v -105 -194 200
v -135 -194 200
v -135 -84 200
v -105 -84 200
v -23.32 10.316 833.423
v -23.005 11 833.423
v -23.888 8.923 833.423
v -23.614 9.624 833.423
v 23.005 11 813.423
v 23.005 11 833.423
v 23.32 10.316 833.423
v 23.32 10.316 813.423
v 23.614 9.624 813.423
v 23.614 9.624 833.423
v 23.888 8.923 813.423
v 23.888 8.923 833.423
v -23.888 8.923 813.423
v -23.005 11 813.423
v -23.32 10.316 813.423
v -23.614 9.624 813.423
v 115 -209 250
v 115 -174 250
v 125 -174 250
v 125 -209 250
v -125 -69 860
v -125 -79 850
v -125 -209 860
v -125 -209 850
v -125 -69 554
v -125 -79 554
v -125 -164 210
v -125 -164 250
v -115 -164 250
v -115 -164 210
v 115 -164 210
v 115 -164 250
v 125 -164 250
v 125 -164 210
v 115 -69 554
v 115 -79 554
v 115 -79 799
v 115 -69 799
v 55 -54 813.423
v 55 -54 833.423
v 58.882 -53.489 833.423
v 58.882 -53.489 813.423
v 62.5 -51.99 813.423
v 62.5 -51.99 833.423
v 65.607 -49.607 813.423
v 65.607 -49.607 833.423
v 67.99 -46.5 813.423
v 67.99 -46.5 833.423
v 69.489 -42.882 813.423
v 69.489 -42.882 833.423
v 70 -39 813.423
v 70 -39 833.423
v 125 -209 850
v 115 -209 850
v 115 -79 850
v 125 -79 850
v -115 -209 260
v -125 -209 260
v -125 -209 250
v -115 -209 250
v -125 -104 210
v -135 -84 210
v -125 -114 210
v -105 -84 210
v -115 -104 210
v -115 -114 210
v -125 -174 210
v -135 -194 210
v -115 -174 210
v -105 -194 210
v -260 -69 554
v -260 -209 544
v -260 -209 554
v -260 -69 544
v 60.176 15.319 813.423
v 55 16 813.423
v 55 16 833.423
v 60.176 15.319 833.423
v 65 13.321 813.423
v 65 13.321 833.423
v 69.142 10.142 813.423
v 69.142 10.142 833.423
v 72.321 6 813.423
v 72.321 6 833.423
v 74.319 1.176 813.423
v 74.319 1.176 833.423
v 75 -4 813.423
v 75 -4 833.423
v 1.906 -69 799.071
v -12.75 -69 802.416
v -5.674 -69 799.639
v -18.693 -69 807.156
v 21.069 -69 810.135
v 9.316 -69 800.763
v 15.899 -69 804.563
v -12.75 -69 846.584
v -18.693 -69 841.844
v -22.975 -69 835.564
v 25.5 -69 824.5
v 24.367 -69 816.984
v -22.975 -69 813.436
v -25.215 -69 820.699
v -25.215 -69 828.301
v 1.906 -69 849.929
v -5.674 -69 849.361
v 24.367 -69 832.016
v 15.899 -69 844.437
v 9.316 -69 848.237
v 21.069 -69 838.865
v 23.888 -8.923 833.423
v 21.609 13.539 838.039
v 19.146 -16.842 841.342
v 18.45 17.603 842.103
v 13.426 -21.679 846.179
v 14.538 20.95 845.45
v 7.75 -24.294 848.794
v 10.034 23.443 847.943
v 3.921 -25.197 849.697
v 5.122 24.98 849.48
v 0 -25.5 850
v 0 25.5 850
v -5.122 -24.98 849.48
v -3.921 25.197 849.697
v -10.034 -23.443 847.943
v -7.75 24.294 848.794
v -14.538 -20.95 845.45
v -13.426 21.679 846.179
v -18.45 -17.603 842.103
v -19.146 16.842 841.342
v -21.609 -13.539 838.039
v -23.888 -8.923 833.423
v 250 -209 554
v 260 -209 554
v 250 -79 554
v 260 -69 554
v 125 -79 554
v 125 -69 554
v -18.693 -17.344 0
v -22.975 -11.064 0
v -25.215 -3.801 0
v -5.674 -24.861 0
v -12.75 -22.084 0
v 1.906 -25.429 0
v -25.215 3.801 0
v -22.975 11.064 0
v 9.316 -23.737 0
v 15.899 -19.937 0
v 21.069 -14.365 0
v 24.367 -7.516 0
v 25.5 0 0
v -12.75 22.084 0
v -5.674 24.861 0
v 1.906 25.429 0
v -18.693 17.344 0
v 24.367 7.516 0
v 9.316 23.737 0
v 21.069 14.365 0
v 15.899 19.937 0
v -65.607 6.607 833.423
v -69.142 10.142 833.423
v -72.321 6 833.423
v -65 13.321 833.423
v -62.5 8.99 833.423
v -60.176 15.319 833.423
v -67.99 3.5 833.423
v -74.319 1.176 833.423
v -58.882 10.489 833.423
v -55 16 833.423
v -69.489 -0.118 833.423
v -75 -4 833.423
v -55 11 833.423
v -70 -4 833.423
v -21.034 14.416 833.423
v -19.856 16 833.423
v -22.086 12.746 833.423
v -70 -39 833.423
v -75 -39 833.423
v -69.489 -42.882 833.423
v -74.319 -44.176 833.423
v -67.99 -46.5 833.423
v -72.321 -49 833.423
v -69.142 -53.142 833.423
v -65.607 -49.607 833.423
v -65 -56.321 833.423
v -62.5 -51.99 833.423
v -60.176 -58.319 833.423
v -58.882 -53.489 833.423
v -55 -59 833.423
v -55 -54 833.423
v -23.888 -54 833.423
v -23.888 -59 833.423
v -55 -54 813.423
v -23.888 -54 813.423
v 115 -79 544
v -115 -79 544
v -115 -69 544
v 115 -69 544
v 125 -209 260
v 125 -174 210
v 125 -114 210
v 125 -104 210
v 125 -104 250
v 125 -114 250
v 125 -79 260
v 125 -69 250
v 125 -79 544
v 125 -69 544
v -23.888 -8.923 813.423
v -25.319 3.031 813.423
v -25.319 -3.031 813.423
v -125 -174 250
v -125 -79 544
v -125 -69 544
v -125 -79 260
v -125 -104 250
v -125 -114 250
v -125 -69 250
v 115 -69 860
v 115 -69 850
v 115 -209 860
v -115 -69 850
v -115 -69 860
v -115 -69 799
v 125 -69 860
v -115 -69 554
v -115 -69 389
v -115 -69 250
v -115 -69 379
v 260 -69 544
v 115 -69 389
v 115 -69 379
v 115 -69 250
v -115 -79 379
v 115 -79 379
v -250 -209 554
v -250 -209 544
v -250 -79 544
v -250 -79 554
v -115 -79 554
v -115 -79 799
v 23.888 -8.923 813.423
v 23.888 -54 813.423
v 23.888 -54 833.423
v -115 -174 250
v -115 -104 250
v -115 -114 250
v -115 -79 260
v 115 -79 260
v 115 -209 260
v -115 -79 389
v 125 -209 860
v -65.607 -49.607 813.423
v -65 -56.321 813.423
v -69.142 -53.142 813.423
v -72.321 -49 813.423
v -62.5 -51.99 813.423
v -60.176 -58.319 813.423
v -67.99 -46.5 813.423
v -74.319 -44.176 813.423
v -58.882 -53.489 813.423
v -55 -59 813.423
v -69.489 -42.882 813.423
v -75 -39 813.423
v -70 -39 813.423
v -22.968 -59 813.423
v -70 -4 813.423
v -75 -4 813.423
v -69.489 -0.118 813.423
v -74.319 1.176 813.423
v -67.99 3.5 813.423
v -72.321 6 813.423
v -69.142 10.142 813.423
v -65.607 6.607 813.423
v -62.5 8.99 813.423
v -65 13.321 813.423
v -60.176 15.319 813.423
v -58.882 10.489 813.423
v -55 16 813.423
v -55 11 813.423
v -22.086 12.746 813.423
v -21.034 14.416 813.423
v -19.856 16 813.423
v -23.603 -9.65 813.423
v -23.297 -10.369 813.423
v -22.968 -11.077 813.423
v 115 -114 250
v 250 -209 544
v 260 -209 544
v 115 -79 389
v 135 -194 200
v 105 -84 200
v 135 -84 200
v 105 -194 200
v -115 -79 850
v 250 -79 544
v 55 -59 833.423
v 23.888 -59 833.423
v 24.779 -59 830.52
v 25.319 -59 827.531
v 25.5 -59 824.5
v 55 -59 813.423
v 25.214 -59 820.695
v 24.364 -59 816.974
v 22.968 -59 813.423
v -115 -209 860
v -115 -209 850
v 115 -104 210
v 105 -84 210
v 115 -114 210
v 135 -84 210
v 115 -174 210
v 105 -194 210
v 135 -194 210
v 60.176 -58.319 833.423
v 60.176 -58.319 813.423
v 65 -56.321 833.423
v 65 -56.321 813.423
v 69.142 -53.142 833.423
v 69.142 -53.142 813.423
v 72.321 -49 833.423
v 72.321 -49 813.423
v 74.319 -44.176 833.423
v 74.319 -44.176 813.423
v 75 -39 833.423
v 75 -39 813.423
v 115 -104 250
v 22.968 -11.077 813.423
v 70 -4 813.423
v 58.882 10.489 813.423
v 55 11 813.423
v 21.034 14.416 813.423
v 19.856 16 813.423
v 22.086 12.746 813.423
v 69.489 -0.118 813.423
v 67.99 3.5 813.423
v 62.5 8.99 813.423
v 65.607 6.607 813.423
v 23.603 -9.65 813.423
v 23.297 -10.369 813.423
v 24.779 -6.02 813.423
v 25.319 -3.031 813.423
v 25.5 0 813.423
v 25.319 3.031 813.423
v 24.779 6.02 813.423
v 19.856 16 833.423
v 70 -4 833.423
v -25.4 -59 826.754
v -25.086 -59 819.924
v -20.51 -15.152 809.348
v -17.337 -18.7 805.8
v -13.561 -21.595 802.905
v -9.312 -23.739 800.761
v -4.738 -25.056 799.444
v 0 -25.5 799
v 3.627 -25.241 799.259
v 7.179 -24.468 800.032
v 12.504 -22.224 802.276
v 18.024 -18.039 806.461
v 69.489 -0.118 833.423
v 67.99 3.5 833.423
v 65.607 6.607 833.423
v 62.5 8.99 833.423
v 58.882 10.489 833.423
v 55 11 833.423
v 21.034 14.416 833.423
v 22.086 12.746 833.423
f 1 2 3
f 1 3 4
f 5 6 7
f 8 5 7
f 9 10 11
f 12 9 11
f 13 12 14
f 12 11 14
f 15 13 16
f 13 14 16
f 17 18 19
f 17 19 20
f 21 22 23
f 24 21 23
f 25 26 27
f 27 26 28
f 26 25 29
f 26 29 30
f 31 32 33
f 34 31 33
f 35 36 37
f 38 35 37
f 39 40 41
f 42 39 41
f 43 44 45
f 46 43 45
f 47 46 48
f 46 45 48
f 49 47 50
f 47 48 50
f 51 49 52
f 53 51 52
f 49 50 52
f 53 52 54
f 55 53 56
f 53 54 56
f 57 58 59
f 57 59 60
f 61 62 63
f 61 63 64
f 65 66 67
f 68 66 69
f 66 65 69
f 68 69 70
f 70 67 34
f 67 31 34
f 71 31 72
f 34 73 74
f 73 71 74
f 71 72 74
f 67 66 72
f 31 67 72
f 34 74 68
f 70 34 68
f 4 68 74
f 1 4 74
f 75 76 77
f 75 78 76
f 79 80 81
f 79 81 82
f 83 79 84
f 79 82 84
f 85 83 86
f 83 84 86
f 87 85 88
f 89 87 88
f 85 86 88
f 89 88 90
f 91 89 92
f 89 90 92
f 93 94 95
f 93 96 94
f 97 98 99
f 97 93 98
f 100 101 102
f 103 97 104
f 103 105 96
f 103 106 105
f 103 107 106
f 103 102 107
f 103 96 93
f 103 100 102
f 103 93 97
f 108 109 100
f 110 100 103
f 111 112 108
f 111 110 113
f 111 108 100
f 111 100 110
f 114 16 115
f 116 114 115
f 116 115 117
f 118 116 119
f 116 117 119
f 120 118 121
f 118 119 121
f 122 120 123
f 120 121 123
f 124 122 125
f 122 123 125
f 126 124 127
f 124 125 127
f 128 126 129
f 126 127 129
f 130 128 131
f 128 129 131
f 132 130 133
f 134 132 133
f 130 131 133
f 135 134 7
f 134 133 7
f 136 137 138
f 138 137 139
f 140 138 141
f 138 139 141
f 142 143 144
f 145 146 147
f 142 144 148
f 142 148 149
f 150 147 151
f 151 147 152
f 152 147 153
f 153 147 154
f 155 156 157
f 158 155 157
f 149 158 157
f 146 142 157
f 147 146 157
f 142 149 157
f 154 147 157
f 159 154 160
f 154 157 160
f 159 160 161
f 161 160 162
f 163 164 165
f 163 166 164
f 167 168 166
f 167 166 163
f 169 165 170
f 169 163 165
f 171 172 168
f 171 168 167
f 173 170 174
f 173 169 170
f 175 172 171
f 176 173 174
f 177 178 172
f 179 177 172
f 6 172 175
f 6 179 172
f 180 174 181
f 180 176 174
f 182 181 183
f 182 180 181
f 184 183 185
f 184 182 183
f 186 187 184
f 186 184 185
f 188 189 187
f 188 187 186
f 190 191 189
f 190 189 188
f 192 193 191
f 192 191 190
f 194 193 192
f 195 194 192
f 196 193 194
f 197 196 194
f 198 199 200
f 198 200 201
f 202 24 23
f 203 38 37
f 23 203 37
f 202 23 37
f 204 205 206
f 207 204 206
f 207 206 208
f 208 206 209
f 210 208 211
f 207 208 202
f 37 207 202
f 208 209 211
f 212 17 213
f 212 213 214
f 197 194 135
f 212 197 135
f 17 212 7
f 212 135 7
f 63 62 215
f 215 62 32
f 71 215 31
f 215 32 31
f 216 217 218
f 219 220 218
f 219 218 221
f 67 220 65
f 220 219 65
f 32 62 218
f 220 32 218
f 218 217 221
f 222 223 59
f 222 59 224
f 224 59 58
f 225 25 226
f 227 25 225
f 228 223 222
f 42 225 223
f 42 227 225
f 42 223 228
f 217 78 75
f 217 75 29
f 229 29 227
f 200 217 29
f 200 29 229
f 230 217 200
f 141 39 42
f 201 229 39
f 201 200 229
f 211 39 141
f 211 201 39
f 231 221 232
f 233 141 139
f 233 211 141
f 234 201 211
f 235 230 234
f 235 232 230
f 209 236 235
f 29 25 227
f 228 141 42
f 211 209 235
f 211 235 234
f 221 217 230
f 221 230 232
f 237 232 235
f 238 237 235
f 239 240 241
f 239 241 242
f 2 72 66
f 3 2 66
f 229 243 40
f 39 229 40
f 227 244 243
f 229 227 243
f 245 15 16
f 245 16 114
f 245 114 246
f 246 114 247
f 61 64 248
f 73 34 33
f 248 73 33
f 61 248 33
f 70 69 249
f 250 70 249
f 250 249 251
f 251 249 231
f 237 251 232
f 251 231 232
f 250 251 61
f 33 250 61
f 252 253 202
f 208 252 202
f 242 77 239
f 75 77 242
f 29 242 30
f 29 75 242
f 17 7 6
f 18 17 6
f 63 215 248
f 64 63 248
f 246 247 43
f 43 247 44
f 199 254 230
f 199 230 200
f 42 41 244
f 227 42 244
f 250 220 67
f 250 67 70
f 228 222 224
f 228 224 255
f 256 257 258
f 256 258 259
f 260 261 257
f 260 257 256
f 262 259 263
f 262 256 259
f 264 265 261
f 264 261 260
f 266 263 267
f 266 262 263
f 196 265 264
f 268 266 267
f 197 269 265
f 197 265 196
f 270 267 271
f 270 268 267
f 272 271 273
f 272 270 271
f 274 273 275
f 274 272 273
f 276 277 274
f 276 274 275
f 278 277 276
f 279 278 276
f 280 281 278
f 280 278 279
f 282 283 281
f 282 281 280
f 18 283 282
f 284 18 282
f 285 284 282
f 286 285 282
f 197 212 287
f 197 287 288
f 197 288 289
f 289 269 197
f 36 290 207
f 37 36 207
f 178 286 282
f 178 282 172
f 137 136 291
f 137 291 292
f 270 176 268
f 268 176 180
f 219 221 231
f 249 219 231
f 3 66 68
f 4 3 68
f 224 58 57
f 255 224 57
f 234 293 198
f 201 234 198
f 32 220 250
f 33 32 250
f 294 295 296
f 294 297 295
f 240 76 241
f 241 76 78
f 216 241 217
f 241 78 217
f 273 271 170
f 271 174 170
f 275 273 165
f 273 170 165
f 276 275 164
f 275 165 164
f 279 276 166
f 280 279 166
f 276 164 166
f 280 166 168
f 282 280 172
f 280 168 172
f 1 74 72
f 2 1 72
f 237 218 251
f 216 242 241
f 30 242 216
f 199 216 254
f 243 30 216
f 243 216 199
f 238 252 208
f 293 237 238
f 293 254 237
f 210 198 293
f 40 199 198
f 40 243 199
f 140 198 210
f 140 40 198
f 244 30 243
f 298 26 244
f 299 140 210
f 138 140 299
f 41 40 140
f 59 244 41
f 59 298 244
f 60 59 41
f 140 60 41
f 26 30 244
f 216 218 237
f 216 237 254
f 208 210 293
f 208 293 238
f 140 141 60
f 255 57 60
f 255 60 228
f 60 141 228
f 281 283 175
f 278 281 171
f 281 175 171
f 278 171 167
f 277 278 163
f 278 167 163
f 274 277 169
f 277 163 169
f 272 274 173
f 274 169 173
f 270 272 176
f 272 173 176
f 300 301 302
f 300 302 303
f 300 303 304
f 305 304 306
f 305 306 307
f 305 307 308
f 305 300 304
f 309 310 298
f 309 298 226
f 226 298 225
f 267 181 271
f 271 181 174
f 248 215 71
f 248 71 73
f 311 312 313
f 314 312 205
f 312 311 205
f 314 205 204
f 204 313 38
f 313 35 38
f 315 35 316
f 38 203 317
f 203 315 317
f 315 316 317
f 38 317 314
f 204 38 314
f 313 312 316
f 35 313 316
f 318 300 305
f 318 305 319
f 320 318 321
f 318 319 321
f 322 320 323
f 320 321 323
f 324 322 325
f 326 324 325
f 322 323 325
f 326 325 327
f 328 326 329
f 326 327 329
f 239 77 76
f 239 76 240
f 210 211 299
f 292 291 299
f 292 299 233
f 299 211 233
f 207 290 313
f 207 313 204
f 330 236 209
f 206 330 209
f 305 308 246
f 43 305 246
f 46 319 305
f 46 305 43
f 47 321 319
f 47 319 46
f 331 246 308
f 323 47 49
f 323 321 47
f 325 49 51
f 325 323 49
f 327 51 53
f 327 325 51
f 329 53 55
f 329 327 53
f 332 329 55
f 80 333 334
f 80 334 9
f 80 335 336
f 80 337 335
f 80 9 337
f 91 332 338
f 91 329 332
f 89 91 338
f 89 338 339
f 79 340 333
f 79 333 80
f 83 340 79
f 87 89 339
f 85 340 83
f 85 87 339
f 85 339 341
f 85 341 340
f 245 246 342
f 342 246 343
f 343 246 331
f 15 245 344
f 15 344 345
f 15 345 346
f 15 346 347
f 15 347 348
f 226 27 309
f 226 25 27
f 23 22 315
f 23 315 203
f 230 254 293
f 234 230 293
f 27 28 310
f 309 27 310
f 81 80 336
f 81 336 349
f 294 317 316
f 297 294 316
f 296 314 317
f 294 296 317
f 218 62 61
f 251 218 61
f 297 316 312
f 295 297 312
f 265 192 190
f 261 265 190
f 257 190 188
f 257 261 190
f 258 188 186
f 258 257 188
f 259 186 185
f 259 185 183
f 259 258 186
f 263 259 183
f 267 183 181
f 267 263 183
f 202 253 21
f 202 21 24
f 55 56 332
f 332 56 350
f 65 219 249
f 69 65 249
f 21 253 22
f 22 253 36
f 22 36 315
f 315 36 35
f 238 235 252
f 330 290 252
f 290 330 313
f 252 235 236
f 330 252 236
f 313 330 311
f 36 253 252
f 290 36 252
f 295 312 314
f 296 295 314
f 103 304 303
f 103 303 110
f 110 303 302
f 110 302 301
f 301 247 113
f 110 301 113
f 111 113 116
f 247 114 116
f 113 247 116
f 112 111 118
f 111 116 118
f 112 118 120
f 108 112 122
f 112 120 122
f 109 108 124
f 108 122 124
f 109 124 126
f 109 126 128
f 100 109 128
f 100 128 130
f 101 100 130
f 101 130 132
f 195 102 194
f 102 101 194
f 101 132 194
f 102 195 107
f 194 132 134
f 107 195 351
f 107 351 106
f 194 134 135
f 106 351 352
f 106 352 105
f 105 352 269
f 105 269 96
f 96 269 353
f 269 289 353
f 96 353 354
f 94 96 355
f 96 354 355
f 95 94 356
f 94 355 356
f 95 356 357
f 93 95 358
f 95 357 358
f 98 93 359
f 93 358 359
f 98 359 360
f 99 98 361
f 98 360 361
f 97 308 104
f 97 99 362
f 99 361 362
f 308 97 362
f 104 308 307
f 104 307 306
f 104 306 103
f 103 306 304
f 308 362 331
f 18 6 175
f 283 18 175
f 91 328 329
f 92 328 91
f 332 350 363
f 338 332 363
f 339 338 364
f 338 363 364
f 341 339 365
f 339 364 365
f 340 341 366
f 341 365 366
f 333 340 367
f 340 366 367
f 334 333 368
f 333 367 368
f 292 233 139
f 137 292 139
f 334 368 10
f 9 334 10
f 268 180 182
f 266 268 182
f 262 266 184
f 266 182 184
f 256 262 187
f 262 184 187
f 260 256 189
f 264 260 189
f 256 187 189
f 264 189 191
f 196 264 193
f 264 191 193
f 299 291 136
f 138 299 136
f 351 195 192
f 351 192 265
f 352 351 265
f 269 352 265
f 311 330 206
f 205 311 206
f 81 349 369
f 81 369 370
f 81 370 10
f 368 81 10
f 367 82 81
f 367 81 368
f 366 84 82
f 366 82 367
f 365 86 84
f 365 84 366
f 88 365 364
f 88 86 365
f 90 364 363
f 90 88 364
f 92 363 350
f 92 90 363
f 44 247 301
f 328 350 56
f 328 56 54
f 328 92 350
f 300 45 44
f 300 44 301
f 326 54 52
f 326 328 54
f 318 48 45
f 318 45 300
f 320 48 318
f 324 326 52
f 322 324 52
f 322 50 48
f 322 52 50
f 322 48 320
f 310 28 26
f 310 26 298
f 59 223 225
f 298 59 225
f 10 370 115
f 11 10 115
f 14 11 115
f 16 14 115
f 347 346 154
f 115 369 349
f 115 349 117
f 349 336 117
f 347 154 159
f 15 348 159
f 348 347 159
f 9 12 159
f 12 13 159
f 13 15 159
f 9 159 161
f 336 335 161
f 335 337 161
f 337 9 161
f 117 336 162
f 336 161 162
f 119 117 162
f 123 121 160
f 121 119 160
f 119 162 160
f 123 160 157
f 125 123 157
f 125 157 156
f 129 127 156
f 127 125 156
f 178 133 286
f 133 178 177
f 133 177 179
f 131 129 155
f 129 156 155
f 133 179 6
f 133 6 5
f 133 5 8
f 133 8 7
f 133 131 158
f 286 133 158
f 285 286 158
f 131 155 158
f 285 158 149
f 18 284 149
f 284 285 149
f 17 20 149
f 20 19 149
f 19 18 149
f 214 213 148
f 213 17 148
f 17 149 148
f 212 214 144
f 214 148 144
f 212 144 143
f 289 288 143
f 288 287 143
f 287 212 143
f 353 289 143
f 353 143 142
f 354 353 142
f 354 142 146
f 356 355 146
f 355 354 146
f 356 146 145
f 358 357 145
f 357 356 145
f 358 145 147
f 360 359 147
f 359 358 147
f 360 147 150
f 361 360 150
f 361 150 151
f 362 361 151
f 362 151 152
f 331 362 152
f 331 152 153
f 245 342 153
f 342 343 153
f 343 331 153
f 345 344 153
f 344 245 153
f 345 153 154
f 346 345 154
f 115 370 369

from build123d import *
from build123d import SkipClean  # not in build123d's __all__

# Parameters (mm, degrees)
F0_R      = 25.5
F1_DEPTH  = 850
F2_R      = 25.5
F3_DEPTH  = 69
F5_DEPTH  = 150
F7_DEPTH  = 75
F8_R      = 20
F10_DEPTH = 20
F12_DEPTH = 10
F13_W     = 230
F13_H     = 155
F14_DEPTH = 10
F16_W     = 10
F16_H     = 130
F16_H_2   = 10
F17_DEPTH = 10
F15_W     = 10
F15_H     = 10
F18_DEPTH = 130
F19_W     = 10
F19_H     = 10
F20_DEPTH = 40
F21_W     = 10
F21_H     = 10
F22_DEPTH = 10


with BuildPart() as f1:
    # F0 (on Top) → F1 (new body)
    with BuildSketch(Plane.XY):
        Circle(F0_R)
    extrude(amount=F1_DEPTH)

    # F2 (on Front) → F3 (join)
    with BuildSketch(Plane.XZ):
        with Locations((0, 824.5)):
            Circle(F2_R)
    with SkipClean():  # cleaning this boolean's faces spoils the solid; the shape is the same uncleaned
        extrude(amount=F3_DEPTH)

    # F4 (on face) → F5 (cut)
    with BuildSketch(Plane.XZ.offset(69)):
        with BuildLine():
            ThreePointArc((-25.5, 824.5), (0, 850), (25.5, 824.5))
            Line((25.5, 824.5), (45.5921813846, 824.5))
            Line((45.5921813846, 824.5), (45.5921813846, 859.704375267))
            Line((45.5921813846, 859.704375267), (-40.7917350531, 859.704375267))
            Line((-40.7917350531, 859.704375267), (-40.7917350531, 824.5))
            Line((-40.7917350531, 824.5), (-25.5, 824.5))
        make_face()
    extrude(amount=-F5_DEPTH, mode=Mode.SUBTRACT)

    # F6 (on Right) → F7 (join, symmetric)
    with BuildSketch(Plane.YZ):
        Polygon((-59, 833.4226703644), (-59, 823.4226703644), (-59, 813.4226703644), (16, 813.4226703644), (16, 833.4226703644), align=None)
    extrude(amount=F7_DEPTH, both=True)

    # F8
    f8_edges = [f1.edges().sort_by_distance(p)[0] for p in [
        (75, 16, 823.42267),
        (-75, 16, 823.42267),
        (-75, -59, 823.42267),
        (75, -59, 823.42267),
    ]]
    fillet(f8_edges, radius=F8_R)

    # F9 (on face) → F10 (cut)
    with BuildSketch(Plane.XY.offset(833.4226703644)):
        with BuildLine():
            Line((-23.8879876417, -54), (-23.8879876417, 8.9226703644))
            Line((-23.8879876417, 8.9226703644), (-23.0054341407, 11))
            Line((-23.0054341407, 11), (-55, 11))
            ThreePointArc((-55, 11), (-65.6066017178, 6.6066017178), (-70, -4))
            Line((-70, -4), (-70, -39))
            ThreePointArc((-70, -39), (-65.6066017178, -49.6066017178), (-55, -54))
            Line((-55, -54), (-23.8879876417, -54))
        make_face()
        with BuildLine():
            Line((23.8879876417, -8.9226703644), (23.8879876417, -54))
            Line((23.8879876417, -54), (55, -54))
            ThreePointArc((55, -54), (65.6066017178, -49.6066017178), (70, -39))
            Line((70, -39), (70, -4))
            ThreePointArc((70, -4), (65.6066017178, 6.6066017178), (55, 11))
            Line((55, 11), (23.0054341407, 11))
            ThreePointArc((23.0054341407, 11), (23.4697054992, 9.9711044415), (23.8879876417, 8.9226703644))
            Line((23.8879876417, 8.9226703644), (23.8879876417, -8.9226703644))
        make_face()
    extrude(amount=-F10_DEPTH, mode=Mode.SUBTRACT)


with BuildPart() as f12:
    # F11 (on face) → F12 (new body)
    with BuildSketch(Plane.XZ.offset(69)):
        Polygon((125, 554), (125, 850), (-125, 850), (-125, 554), (-260, 554), (-260, 544), (-125, 544), (-125, 250), (-115, 250), (-115, 379), (0, 379), (115, 379), (115, 250), (125, 250), (125, 544), (260, 544), (260, 554), align=None)
    extrude(amount=F12_DEPTH)

    # F13 (on face) → F14 (cut)
    with BuildSketch(Plane.XZ.offset(79)):
        Polygon((115, 799), (0, 799), (-115, 799), (-115, 554), (115, 554), align=None)
        with Locations((0, 466.5)):
            Rectangle(F13_W, F13_H)
    extrude(amount=-F14_DEPTH, mode=Mode.SUBTRACT)

    # F16 (on face) → F17 (join)
    with BuildSketch(Plane.XY.offset(850)):
        with Locations((-120, -144)):
            Rectangle(F16_W, F16_H)
        with Locations((120, -74)):
            Rectangle(F16_W, F16_H_2)
        with Locations((-120, -74)):
            Rectangle(F16_W, F16_H_2)
        with Locations((120, -144)):
            Rectangle(F16_W, F16_H)
    extrude(amount=F17_DEPTH)

    # F15 (on face) → F18 (join)
    with BuildSketch(Plane.XZ.offset(79)):
        with Locations((-255, 549)):
            Rectangle(F15_W, F15_H)
        with Locations((255, 549)):
            Rectangle(F15_W, F15_H)
        with Locations((120, 255)):
            Rectangle(F15_W, F15_H)
        with Locations((-120, 255)):
            Rectangle(F15_W, F15_H)
    extrude(amount=F18_DEPTH)

    # F19 (on face) → F20 (join)
    with BuildSketch(Plane(origin=(0, 0, 250), x_dir=(1, 0, 0), z_dir=(0, 0, -1))):
        with Locations((-120, 109)):
            Rectangle(F19_W, F19_H)
        with Locations((-120, 169)):
            Rectangle(F19_W, F19_H)
        with Locations((120, 169)):
            Rectangle(F19_W, F19_H)
        with Locations((120, 109)):
            Rectangle(F19_W, F19_H)
    extrude(amount=F20_DEPTH)

    # F21 (on face) → F22 (join)
    with BuildSketch(Plane(origin=(0, 0, 210), x_dir=(1, 0, 0), z_dir=(0, 0, -1))):
        Polygon((-135, 194), (-135, 104), (-135, 84), (-105, 84), (-105, 194), align=None)
        with Locations((-120, 109)):
            Rectangle(F21_W, F21_H, mode=Mode.SUBTRACT)
        Polygon((105, 84), (135, 84), (135, 104), (135, 194), (105, 194), align=None)
        with Locations((-120, 109)):
            Rectangle(F21_W, F21_H)
    extrude(amount=F22_DEPTH)


solid = Compound([f1.part, f12.part])
